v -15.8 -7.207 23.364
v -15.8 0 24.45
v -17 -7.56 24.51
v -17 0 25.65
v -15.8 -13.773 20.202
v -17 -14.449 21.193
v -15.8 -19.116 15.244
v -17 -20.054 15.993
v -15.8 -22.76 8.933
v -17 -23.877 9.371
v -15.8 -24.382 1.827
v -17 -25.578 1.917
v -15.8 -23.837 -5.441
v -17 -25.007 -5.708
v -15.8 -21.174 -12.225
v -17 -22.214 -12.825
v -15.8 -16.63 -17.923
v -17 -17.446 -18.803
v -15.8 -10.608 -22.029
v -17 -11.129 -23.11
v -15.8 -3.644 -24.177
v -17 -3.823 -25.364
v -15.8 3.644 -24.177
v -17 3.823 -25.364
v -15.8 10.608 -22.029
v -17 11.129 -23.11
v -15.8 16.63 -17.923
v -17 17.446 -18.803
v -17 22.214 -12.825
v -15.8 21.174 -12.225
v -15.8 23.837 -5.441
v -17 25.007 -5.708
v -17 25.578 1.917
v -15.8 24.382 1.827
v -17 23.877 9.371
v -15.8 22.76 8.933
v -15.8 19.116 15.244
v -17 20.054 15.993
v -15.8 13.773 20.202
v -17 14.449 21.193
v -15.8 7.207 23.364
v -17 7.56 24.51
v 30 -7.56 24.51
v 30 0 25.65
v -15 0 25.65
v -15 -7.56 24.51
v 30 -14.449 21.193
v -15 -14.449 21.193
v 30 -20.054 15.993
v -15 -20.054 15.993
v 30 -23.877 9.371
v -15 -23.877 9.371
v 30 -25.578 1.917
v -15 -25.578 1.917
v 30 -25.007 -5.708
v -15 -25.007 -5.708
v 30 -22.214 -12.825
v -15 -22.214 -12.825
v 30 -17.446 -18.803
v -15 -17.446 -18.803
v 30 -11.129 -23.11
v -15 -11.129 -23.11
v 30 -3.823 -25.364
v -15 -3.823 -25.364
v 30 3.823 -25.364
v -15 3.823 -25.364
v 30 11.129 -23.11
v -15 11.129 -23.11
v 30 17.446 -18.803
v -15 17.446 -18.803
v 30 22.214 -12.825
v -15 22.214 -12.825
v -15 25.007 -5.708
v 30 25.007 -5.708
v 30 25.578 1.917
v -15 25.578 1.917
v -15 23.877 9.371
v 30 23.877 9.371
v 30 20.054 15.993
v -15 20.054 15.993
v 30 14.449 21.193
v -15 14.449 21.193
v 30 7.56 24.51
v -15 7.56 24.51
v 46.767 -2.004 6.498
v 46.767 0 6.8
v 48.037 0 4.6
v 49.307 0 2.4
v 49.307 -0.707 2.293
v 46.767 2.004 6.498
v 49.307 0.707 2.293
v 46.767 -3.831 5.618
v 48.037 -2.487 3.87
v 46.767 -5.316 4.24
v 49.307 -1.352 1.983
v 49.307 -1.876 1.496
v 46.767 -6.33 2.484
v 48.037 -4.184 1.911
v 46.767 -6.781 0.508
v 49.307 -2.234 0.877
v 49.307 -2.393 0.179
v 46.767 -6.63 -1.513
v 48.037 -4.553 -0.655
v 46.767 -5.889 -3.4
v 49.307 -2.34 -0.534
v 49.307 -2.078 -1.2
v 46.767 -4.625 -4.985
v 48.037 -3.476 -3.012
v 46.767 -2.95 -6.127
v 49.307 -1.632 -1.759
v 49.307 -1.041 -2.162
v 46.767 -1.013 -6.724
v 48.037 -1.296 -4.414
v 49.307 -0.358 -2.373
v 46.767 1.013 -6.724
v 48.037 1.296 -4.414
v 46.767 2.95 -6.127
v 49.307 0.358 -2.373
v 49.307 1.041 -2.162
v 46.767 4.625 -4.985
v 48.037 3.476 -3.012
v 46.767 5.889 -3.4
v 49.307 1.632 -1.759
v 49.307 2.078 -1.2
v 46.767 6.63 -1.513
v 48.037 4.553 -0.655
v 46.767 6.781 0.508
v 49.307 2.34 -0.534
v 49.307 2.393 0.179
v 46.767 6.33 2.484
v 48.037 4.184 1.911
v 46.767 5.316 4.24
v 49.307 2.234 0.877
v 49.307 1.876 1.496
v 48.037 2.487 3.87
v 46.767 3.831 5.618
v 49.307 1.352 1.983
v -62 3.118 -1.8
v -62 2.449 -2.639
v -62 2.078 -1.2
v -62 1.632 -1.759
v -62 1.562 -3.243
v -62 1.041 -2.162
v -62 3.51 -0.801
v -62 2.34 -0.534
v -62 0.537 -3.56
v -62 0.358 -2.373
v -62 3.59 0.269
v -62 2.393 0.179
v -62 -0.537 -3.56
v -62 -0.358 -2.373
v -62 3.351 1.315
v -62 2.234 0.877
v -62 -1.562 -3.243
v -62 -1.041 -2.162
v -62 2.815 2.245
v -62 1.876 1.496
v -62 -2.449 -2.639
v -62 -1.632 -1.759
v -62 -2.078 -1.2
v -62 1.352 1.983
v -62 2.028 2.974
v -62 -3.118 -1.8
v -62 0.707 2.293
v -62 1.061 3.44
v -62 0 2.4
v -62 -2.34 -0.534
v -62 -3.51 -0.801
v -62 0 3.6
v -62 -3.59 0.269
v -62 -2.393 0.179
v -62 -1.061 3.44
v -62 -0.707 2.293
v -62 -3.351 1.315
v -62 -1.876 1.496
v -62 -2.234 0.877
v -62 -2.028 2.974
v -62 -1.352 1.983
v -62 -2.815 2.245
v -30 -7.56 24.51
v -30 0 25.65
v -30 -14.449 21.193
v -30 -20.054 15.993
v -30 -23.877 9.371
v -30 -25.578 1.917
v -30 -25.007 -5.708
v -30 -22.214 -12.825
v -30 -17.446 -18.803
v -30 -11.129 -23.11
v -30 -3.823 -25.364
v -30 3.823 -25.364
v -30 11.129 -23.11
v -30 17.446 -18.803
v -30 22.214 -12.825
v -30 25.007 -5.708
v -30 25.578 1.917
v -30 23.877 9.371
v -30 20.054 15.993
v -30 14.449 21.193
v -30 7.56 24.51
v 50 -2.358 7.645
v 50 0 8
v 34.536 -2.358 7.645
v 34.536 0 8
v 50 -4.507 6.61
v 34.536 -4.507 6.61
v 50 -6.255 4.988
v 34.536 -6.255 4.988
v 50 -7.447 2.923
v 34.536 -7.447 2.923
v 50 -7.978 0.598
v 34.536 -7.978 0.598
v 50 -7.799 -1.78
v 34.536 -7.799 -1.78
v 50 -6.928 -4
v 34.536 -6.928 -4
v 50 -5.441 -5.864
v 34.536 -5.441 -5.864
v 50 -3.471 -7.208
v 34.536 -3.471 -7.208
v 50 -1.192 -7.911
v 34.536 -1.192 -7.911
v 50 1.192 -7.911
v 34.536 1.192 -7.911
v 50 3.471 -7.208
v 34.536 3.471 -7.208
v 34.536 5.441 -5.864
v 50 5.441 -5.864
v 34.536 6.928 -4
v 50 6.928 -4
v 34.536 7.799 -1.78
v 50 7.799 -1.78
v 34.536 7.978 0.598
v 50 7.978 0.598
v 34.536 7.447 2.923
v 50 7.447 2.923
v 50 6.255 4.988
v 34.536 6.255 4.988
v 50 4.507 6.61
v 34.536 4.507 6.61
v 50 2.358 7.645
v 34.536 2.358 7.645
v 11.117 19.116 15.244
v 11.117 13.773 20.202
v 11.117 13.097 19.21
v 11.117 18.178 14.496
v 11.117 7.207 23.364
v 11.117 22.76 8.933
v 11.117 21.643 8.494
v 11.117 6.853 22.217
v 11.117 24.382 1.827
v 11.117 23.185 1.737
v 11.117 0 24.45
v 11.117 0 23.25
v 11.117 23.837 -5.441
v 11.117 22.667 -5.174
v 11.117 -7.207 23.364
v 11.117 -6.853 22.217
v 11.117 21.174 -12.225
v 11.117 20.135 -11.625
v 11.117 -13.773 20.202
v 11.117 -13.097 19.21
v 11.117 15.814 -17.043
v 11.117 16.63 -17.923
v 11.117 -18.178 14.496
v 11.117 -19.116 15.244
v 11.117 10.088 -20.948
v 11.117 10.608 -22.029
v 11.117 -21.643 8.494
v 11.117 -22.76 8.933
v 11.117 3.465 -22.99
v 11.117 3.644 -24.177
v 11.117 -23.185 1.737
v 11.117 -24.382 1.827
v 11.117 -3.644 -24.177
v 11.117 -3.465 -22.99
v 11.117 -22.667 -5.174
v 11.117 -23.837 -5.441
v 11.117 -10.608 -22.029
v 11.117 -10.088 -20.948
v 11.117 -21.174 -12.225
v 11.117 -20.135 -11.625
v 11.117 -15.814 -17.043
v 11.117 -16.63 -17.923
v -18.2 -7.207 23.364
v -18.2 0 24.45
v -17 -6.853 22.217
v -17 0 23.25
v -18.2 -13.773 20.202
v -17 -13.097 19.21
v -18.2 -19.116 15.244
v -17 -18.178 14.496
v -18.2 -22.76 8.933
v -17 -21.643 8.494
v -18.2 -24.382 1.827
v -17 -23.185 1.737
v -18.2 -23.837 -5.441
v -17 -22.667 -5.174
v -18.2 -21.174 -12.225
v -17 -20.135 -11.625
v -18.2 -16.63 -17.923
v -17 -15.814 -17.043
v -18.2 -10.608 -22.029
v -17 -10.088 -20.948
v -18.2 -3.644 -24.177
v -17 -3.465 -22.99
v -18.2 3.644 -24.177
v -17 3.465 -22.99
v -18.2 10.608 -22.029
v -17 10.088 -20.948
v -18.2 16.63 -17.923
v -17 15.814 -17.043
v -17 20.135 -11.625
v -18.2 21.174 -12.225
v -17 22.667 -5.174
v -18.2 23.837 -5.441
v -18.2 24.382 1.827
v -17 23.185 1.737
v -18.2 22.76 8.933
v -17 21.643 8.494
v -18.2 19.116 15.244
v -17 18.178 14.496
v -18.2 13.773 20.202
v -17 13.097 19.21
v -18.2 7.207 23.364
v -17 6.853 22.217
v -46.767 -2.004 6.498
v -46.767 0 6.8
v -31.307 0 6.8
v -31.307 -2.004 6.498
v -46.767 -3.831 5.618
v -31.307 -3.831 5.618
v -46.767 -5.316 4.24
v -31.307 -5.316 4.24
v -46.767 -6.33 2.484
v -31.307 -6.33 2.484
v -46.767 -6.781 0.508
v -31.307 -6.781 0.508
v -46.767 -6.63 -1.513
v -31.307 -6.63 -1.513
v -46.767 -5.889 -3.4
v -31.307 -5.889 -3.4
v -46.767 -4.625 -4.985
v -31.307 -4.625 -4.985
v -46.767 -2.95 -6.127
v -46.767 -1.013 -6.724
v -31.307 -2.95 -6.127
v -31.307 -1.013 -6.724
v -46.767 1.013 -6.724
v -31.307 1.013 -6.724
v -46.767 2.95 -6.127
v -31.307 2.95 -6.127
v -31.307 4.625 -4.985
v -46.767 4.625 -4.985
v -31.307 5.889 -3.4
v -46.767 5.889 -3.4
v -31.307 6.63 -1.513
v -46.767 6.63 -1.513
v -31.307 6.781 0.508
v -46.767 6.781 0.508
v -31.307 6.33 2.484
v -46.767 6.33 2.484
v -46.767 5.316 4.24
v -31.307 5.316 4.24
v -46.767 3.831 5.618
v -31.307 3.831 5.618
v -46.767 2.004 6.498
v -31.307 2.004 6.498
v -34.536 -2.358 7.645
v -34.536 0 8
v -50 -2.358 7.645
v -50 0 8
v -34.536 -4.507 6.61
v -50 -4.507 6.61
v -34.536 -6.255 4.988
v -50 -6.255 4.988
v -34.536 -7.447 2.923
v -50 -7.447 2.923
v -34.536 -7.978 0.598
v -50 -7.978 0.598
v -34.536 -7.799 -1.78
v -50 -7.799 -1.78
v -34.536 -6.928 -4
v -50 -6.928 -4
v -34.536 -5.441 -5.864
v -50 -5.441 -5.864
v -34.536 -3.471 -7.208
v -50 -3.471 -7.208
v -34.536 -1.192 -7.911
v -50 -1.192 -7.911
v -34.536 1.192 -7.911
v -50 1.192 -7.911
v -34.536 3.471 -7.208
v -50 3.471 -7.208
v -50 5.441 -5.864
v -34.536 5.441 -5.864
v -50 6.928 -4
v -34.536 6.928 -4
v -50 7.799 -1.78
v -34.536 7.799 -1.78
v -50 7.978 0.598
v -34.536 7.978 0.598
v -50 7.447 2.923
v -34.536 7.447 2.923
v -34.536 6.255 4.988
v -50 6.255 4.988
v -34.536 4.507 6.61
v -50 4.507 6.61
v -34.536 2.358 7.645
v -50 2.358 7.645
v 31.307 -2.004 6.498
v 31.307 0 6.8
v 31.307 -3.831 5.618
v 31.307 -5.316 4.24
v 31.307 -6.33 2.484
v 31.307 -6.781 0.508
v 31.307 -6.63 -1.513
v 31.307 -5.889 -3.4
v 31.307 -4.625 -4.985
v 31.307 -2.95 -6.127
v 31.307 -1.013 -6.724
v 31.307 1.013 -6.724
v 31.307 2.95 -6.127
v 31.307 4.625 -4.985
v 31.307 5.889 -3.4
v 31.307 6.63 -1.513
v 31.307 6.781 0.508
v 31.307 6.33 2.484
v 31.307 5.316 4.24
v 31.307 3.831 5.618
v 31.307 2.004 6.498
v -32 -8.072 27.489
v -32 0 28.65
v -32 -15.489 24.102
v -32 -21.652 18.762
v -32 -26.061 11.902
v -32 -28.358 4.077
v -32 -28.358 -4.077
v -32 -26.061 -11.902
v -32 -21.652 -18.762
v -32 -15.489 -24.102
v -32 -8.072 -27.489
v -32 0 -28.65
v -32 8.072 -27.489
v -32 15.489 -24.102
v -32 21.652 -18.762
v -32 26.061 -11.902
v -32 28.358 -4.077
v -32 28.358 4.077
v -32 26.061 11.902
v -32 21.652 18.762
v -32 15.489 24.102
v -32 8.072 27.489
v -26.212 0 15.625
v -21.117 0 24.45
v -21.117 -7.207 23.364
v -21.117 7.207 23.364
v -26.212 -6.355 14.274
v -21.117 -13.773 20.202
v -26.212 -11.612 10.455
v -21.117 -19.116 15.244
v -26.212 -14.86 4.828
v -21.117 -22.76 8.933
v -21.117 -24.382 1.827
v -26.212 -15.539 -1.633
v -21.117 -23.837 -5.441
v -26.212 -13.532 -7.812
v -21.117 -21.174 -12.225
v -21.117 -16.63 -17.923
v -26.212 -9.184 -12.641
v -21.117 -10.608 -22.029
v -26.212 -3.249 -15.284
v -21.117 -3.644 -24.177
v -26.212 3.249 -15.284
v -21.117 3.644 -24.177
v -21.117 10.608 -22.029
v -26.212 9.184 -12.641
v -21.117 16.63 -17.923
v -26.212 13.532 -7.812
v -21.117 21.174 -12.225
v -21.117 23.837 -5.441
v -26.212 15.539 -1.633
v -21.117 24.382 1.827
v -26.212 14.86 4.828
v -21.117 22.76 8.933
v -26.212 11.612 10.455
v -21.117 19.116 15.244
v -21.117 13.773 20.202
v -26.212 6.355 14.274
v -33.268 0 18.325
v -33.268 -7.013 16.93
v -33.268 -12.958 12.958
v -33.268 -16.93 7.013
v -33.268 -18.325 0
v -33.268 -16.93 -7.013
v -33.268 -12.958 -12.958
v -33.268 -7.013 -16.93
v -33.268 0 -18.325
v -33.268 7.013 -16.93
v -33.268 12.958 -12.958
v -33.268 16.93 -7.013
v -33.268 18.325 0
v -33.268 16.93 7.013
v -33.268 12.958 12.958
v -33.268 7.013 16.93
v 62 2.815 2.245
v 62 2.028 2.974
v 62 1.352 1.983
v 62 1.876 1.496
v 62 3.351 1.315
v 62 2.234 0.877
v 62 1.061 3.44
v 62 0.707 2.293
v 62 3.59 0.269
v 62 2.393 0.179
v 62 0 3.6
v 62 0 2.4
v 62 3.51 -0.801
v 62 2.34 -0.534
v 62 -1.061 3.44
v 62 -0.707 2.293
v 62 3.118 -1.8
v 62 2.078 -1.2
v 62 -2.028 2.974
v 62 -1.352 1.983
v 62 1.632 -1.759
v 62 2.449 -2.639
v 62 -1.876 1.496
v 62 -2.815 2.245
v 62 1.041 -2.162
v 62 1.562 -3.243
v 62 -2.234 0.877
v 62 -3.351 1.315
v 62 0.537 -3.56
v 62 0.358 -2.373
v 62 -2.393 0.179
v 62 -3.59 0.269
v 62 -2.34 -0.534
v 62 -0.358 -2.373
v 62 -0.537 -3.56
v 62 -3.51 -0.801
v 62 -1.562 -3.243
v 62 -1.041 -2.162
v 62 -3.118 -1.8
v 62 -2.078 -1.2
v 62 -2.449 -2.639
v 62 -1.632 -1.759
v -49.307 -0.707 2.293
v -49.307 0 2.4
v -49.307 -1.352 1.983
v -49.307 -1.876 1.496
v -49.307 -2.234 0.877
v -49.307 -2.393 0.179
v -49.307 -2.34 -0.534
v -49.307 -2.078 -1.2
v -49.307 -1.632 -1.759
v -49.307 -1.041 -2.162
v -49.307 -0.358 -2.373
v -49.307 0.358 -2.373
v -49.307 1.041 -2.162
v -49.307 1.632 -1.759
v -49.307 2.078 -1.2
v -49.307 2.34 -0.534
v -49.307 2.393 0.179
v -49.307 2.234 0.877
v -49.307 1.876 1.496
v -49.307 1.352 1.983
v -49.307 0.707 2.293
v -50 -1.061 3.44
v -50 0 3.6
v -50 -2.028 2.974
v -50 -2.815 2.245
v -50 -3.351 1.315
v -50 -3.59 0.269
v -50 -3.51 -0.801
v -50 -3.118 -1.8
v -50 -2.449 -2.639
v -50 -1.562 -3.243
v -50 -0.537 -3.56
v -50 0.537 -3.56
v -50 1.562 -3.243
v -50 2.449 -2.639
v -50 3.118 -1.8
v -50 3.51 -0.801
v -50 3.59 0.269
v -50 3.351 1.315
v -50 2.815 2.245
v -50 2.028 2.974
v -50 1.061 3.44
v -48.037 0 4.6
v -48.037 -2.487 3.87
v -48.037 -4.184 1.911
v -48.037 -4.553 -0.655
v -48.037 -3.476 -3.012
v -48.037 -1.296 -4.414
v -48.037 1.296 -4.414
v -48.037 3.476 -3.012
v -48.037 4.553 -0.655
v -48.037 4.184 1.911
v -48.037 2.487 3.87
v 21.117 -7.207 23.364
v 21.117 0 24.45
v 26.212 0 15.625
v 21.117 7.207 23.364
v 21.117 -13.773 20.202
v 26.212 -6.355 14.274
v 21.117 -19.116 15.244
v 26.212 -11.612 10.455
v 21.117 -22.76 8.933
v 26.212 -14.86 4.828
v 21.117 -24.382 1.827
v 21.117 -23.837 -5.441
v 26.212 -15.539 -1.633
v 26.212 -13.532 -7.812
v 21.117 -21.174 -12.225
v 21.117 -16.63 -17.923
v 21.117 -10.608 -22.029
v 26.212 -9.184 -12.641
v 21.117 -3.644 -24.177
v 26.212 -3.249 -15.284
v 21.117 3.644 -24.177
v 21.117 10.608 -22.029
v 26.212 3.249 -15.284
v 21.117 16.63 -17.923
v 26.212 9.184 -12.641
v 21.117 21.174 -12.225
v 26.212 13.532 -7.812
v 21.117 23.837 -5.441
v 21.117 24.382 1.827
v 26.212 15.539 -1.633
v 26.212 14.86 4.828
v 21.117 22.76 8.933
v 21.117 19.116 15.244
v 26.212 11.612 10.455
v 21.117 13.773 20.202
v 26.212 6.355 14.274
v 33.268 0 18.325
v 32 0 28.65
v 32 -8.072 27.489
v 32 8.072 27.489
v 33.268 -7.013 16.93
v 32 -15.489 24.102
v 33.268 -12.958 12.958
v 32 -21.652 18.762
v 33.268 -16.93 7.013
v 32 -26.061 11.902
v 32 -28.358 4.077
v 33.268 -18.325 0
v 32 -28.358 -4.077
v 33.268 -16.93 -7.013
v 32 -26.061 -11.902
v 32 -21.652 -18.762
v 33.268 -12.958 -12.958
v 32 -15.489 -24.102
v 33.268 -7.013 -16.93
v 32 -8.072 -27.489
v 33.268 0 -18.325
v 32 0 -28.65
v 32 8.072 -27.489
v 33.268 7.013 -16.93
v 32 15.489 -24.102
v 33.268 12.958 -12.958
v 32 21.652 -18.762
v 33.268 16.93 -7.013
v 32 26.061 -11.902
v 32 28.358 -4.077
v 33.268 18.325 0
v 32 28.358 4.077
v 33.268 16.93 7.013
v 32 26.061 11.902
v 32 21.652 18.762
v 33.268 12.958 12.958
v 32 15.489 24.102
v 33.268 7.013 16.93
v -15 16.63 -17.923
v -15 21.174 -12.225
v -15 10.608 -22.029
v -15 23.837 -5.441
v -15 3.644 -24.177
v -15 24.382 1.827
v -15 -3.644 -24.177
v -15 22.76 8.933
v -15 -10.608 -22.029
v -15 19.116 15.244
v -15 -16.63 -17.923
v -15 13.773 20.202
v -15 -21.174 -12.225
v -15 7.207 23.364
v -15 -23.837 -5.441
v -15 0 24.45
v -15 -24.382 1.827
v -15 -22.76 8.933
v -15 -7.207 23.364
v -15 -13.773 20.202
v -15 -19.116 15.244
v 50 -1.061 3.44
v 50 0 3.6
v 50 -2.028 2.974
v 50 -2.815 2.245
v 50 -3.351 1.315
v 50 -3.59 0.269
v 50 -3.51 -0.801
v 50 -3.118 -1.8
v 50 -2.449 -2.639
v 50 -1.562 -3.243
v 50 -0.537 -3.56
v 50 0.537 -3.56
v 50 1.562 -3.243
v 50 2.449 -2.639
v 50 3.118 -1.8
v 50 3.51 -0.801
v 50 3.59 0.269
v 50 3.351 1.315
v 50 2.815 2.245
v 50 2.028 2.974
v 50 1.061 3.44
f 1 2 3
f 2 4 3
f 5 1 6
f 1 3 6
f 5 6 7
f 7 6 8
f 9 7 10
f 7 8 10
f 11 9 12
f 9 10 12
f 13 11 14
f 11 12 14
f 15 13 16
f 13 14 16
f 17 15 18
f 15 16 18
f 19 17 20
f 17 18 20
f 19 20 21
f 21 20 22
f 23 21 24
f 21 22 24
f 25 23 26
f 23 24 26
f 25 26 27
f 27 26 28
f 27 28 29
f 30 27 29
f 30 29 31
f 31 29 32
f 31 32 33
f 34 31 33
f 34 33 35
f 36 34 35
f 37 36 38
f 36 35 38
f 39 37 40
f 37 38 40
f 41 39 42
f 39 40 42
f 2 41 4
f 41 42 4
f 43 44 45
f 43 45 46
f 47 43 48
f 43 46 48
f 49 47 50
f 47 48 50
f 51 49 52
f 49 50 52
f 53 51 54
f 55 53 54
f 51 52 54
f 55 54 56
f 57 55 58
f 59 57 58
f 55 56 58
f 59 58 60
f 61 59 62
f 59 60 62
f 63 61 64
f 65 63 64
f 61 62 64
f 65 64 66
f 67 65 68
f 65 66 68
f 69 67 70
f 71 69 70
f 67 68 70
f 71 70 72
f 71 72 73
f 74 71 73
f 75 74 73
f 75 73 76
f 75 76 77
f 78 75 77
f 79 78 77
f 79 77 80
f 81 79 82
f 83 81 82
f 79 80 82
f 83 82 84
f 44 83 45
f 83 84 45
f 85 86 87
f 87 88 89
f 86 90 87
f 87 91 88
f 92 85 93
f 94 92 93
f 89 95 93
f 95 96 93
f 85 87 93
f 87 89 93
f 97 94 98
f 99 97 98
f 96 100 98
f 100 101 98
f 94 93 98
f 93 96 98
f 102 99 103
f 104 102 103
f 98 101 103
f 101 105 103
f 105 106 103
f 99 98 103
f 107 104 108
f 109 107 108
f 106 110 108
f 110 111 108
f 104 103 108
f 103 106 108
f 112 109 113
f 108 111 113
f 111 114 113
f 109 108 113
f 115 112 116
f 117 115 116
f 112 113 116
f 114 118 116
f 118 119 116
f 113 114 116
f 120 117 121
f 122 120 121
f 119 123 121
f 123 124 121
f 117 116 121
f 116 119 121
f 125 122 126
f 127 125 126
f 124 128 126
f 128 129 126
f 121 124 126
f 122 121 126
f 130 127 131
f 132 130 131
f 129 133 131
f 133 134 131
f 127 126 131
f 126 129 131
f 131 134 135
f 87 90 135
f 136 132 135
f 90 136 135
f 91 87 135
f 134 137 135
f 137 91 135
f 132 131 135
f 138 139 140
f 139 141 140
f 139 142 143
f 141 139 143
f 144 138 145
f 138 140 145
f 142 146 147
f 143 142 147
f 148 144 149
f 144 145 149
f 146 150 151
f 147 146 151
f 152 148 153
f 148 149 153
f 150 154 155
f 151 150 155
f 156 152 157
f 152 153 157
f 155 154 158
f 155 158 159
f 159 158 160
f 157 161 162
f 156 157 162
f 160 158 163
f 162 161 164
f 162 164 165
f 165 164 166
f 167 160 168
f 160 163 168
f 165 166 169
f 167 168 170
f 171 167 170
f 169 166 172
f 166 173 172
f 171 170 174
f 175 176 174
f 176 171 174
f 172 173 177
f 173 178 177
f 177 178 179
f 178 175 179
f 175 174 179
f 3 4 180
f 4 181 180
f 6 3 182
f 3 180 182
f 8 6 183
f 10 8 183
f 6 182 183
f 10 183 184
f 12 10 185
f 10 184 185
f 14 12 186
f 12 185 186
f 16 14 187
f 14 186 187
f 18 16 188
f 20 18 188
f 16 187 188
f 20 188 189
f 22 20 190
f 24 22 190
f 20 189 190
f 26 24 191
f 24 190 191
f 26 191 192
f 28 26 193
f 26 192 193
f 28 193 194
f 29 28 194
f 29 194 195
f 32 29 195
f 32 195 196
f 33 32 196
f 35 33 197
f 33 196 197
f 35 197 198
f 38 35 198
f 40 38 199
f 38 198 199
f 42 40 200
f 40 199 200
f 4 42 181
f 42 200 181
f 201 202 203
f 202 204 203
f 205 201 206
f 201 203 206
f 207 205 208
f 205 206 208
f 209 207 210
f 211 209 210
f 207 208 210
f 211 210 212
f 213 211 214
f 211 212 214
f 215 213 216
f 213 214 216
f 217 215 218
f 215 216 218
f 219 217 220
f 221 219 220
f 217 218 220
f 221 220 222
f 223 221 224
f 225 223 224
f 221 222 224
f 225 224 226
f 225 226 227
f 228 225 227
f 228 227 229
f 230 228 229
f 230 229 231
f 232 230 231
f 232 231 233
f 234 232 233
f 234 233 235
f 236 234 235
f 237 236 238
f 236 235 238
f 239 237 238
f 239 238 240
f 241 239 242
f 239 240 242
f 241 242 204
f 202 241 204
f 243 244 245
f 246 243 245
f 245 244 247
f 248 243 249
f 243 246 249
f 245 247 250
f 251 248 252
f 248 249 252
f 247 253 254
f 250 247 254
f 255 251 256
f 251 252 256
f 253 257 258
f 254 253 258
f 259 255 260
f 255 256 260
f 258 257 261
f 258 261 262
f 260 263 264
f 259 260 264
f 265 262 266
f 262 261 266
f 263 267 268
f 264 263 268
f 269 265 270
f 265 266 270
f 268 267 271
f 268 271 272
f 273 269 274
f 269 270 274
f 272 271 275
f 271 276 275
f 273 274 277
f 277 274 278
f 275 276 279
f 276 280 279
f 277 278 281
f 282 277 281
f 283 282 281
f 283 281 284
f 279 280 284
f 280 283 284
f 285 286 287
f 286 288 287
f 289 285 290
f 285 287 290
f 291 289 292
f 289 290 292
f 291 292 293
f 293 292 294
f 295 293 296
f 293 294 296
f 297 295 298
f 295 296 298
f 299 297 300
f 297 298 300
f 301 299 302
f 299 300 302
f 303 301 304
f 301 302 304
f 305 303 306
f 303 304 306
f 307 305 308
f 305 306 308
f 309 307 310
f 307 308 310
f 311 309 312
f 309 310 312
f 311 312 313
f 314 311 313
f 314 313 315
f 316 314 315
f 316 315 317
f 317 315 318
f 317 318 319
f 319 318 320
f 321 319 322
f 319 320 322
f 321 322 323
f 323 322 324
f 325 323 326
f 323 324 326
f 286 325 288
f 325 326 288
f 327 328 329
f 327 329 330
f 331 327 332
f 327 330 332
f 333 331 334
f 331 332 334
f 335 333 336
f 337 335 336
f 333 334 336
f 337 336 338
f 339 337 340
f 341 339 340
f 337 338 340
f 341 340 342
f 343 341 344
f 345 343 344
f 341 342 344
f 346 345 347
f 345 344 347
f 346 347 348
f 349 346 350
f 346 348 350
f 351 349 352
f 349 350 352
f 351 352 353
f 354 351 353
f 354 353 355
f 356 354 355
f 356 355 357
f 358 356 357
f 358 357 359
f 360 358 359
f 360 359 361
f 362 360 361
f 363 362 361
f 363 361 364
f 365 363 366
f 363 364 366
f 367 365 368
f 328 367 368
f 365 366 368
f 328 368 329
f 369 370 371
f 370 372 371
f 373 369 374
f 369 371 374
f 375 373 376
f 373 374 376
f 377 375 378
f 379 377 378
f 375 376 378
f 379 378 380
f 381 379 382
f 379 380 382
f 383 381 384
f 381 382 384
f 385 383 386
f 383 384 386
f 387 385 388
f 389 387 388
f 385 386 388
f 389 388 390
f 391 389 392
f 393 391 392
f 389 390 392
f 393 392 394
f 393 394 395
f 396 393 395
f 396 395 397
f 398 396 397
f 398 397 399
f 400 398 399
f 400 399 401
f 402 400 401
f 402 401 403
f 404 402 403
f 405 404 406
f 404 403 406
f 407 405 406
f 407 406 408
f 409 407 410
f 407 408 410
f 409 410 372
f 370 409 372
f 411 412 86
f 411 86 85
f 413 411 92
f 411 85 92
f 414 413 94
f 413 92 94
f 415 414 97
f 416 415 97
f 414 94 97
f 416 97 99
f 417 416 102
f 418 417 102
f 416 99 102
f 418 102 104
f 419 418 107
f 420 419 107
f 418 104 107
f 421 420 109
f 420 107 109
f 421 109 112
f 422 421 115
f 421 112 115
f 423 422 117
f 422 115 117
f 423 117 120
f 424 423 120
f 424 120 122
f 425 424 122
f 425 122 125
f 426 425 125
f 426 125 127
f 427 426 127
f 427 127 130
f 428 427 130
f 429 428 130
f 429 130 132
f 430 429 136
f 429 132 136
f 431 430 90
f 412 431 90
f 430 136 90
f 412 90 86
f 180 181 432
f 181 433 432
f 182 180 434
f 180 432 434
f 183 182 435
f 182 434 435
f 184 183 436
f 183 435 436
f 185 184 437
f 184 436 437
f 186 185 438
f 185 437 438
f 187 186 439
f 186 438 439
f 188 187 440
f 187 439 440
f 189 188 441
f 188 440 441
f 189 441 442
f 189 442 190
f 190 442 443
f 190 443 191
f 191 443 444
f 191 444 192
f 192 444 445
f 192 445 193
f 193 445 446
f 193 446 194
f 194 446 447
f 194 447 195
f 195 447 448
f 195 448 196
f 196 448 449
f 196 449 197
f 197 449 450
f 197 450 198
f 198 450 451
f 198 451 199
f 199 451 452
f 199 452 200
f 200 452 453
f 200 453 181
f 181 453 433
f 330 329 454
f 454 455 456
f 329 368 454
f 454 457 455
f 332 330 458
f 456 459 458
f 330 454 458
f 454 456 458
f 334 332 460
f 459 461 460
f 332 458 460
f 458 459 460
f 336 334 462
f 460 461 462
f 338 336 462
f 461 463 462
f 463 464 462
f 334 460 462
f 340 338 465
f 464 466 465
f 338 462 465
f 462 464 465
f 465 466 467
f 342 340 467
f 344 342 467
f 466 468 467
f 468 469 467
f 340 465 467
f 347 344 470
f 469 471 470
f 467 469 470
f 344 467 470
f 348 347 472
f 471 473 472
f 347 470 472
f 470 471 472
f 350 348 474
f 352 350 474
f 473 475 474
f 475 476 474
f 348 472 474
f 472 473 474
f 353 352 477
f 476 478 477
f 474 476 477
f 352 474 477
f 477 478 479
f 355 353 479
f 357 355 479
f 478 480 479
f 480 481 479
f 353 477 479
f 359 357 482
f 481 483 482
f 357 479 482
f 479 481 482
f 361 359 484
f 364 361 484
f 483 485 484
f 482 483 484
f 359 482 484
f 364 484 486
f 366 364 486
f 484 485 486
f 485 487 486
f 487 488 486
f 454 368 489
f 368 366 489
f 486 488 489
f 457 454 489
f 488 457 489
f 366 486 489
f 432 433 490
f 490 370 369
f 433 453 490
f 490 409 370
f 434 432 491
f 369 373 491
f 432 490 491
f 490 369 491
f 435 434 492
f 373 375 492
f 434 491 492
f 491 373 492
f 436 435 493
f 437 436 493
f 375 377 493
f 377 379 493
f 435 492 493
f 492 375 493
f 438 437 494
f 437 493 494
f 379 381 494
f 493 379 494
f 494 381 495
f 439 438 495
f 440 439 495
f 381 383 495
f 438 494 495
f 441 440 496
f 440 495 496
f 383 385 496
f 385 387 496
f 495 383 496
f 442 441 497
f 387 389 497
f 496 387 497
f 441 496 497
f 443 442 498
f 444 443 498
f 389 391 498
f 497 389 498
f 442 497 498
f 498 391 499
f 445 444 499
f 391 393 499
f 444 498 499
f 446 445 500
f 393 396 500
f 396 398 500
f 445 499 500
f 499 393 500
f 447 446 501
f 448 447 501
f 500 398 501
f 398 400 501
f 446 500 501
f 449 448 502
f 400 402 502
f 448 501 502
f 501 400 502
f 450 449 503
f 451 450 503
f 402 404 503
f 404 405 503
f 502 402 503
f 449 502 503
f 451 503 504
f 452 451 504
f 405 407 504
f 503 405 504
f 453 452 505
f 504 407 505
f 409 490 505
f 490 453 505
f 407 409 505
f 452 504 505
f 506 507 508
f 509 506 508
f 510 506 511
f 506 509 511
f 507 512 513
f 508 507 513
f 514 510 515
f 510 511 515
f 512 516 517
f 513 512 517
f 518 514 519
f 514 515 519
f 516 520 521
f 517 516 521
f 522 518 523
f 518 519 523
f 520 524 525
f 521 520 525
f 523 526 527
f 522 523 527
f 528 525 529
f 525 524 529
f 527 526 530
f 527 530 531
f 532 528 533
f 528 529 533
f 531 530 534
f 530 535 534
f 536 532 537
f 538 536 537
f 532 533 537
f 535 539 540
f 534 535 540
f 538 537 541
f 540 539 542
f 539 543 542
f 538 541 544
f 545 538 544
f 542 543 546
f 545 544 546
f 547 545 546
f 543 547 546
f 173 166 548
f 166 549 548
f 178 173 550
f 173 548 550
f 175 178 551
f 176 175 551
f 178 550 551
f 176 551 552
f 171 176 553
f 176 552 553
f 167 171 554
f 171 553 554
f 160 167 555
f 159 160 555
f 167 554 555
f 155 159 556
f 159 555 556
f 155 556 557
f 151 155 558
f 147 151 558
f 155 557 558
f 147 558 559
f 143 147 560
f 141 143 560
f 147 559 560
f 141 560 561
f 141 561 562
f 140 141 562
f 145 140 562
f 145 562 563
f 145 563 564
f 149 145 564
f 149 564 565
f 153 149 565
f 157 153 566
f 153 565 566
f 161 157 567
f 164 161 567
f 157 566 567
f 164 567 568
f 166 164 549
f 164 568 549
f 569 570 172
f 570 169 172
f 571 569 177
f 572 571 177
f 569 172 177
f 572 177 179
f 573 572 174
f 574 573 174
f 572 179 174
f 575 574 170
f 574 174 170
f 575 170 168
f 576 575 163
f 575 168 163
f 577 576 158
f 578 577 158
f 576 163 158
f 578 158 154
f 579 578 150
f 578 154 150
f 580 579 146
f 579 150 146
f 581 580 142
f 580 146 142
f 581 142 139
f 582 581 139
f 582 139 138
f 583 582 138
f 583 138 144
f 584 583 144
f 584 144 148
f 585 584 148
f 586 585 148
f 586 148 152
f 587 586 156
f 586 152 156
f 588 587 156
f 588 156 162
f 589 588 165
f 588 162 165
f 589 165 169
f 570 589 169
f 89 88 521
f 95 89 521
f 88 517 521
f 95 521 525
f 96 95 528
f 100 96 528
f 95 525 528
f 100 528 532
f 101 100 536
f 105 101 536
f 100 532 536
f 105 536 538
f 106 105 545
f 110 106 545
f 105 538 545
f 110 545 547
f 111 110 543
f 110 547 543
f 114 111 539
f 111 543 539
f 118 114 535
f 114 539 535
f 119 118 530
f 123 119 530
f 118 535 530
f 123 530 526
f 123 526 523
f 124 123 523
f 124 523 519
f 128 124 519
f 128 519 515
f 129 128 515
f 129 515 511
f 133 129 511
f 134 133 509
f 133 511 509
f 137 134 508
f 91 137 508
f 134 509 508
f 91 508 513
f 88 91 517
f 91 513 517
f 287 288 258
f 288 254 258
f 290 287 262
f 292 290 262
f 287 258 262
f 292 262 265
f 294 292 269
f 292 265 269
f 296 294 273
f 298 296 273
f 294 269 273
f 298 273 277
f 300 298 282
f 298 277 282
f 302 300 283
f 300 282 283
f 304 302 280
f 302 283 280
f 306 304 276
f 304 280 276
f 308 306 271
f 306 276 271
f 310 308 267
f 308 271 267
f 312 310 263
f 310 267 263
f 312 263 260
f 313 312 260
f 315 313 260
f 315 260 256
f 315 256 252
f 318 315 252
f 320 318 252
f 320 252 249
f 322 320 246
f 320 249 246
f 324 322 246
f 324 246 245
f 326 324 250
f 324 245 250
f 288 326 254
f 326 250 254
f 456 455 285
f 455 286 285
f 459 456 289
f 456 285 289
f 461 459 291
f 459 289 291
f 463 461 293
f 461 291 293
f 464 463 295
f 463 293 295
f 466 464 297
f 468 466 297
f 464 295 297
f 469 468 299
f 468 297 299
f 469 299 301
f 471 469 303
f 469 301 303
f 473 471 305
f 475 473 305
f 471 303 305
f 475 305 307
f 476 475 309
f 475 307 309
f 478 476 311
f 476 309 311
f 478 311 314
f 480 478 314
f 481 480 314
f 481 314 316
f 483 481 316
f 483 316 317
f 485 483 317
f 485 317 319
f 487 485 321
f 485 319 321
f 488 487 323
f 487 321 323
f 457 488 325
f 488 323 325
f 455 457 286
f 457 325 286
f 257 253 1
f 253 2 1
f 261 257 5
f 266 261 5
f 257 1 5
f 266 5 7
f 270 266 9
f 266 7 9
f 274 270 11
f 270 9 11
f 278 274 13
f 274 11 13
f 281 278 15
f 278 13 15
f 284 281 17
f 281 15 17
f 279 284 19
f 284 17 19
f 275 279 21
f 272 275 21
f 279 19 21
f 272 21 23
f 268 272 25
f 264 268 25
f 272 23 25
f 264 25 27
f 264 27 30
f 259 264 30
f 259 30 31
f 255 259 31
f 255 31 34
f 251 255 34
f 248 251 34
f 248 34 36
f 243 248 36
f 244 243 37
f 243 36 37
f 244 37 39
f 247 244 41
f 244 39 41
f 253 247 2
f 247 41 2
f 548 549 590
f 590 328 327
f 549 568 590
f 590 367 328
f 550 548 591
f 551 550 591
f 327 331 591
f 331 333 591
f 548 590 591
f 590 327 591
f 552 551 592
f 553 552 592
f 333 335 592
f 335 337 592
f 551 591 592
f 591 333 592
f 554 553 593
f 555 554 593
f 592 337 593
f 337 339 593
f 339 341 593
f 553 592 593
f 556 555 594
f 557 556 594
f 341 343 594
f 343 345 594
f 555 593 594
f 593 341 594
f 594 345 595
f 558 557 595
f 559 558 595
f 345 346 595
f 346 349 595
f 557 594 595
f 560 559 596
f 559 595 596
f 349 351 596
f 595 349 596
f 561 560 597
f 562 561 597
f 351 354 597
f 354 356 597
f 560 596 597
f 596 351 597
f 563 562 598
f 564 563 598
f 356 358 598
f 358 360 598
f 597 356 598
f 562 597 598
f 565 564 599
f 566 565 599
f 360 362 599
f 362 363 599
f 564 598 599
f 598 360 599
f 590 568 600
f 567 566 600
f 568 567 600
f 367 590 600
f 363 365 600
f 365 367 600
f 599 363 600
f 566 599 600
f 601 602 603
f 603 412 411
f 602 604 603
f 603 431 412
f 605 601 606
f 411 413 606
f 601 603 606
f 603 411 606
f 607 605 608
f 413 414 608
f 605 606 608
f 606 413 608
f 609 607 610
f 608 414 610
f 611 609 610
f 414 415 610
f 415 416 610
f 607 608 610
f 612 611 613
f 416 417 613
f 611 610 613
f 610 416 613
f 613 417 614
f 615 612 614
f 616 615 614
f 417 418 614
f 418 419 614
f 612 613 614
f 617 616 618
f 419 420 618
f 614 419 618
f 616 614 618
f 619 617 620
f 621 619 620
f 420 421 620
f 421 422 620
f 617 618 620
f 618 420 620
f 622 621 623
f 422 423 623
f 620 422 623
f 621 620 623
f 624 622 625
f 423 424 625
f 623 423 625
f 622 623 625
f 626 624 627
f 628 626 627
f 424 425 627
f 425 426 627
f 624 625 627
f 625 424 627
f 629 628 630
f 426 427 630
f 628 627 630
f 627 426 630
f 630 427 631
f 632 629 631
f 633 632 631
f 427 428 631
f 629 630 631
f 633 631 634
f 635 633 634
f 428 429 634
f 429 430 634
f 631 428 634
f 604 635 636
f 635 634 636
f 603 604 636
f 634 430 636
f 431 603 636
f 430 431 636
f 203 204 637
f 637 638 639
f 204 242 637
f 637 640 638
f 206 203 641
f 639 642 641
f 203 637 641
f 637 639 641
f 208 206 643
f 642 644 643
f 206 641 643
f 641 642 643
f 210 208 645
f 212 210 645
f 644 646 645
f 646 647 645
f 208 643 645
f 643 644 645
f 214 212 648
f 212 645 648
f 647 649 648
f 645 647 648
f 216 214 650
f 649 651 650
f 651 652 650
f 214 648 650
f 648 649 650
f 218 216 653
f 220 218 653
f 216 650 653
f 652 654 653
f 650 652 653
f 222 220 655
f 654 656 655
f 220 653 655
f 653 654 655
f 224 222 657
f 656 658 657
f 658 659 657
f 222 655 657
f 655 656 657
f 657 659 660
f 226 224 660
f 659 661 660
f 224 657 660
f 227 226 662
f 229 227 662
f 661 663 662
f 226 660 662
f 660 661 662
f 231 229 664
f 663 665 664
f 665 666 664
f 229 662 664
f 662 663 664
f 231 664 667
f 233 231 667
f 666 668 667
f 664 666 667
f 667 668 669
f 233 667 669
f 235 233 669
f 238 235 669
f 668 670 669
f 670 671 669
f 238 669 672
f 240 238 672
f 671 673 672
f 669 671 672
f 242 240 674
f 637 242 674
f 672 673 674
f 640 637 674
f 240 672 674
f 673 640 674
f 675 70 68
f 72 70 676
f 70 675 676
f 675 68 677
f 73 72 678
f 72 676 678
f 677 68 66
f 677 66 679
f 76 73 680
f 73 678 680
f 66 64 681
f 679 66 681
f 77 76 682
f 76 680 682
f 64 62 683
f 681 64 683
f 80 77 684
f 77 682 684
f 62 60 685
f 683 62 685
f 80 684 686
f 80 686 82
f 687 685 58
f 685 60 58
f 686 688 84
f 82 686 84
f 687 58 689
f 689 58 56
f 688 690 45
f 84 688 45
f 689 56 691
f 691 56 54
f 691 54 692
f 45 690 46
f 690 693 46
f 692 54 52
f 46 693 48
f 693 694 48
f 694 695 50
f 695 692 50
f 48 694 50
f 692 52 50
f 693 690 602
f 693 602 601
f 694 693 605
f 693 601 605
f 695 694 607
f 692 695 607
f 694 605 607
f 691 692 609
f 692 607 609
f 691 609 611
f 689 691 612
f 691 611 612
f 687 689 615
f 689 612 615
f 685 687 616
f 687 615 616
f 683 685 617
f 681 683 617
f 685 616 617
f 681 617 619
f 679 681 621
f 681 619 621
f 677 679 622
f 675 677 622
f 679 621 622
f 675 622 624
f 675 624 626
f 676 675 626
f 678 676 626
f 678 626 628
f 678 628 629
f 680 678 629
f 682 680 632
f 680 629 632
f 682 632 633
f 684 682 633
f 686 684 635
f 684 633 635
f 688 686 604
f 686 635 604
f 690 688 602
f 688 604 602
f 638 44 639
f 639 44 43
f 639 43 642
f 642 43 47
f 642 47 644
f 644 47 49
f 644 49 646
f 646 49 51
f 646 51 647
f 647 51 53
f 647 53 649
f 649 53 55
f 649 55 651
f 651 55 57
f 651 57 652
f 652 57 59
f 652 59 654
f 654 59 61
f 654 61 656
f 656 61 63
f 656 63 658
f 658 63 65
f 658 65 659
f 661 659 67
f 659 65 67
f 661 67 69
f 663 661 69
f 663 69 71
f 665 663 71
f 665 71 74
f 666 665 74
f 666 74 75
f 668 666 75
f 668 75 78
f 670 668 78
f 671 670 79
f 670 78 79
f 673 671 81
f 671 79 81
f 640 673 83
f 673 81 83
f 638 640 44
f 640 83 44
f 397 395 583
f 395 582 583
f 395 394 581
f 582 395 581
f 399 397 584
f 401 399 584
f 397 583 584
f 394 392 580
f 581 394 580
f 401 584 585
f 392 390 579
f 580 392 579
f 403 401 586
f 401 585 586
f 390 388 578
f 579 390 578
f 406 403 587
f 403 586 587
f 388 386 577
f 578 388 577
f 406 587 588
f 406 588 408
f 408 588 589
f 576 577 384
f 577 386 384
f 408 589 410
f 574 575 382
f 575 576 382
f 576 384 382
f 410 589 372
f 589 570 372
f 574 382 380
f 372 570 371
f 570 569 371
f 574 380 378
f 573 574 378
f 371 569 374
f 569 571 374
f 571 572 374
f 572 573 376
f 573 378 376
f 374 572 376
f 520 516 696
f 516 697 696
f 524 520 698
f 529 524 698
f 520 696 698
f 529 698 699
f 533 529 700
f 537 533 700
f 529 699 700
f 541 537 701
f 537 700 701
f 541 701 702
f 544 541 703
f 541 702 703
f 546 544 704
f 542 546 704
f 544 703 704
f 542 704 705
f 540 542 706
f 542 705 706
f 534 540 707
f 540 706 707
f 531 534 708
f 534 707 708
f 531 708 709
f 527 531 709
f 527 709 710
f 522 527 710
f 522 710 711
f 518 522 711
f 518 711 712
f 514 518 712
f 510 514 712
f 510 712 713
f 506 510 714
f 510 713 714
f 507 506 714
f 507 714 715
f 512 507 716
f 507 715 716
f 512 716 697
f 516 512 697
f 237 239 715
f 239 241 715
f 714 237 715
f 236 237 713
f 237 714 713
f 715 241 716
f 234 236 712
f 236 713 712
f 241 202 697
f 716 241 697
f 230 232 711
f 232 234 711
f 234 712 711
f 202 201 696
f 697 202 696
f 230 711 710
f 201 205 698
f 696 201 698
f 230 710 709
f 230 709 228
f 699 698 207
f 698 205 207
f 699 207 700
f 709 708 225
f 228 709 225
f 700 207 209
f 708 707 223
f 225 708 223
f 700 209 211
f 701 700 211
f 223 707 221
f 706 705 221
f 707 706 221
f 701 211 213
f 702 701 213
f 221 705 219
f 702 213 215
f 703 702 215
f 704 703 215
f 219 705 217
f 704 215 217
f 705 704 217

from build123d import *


with BuildPart() as f1:
    # F0 (on Front) → F1 (revolve)
    with BuildSketch(Plane.XZ):
        Polygon((62, 2.4), (62, 3.6), (50, 3.6), (50, 8), (34.535501, 8), (32, 28.65), (30, 25.65), (-15, 25.65), (-15, 24.45), (21.116947, 24.45), (31.30718, 6.8), (46.766838, 6.8), (49.30718, 2.4), align=None)
    revolve(axis=Axis((37.433878, 0, 0), (1, 0, 0)))


with BuildPart() as f3:
    # F2 (on Front) → F3 (revolve)
    with BuildSketch(Plane.XZ):
        Polygon((-17, 25.65), (-30, 25.65), (-32, 28.65), (-34.535501, 8), (-50, 8), (-50, 3.6), (-62, 3.6), (-62, 2.4), (-49.30718, 2.4), (-46.766838, 6.8), (-31.30718, 6.8), (-21.116947, 24.45), (-18.2, 24.45), align=None)
        Polygon((-15.8, 24.45), (-17, 25.65), (-18.2, 24.45), (-17, 23.25), align=None)
        Polygon((11.116947, 24.45), (-15.8, 24.45), (-17, 23.25), (11.116947, 23.25), align=None)
    revolve(axis=Axis((37.433878, 0, 0), (1, 0, 0)))


solid = Compound([f1.part, f3.part])
